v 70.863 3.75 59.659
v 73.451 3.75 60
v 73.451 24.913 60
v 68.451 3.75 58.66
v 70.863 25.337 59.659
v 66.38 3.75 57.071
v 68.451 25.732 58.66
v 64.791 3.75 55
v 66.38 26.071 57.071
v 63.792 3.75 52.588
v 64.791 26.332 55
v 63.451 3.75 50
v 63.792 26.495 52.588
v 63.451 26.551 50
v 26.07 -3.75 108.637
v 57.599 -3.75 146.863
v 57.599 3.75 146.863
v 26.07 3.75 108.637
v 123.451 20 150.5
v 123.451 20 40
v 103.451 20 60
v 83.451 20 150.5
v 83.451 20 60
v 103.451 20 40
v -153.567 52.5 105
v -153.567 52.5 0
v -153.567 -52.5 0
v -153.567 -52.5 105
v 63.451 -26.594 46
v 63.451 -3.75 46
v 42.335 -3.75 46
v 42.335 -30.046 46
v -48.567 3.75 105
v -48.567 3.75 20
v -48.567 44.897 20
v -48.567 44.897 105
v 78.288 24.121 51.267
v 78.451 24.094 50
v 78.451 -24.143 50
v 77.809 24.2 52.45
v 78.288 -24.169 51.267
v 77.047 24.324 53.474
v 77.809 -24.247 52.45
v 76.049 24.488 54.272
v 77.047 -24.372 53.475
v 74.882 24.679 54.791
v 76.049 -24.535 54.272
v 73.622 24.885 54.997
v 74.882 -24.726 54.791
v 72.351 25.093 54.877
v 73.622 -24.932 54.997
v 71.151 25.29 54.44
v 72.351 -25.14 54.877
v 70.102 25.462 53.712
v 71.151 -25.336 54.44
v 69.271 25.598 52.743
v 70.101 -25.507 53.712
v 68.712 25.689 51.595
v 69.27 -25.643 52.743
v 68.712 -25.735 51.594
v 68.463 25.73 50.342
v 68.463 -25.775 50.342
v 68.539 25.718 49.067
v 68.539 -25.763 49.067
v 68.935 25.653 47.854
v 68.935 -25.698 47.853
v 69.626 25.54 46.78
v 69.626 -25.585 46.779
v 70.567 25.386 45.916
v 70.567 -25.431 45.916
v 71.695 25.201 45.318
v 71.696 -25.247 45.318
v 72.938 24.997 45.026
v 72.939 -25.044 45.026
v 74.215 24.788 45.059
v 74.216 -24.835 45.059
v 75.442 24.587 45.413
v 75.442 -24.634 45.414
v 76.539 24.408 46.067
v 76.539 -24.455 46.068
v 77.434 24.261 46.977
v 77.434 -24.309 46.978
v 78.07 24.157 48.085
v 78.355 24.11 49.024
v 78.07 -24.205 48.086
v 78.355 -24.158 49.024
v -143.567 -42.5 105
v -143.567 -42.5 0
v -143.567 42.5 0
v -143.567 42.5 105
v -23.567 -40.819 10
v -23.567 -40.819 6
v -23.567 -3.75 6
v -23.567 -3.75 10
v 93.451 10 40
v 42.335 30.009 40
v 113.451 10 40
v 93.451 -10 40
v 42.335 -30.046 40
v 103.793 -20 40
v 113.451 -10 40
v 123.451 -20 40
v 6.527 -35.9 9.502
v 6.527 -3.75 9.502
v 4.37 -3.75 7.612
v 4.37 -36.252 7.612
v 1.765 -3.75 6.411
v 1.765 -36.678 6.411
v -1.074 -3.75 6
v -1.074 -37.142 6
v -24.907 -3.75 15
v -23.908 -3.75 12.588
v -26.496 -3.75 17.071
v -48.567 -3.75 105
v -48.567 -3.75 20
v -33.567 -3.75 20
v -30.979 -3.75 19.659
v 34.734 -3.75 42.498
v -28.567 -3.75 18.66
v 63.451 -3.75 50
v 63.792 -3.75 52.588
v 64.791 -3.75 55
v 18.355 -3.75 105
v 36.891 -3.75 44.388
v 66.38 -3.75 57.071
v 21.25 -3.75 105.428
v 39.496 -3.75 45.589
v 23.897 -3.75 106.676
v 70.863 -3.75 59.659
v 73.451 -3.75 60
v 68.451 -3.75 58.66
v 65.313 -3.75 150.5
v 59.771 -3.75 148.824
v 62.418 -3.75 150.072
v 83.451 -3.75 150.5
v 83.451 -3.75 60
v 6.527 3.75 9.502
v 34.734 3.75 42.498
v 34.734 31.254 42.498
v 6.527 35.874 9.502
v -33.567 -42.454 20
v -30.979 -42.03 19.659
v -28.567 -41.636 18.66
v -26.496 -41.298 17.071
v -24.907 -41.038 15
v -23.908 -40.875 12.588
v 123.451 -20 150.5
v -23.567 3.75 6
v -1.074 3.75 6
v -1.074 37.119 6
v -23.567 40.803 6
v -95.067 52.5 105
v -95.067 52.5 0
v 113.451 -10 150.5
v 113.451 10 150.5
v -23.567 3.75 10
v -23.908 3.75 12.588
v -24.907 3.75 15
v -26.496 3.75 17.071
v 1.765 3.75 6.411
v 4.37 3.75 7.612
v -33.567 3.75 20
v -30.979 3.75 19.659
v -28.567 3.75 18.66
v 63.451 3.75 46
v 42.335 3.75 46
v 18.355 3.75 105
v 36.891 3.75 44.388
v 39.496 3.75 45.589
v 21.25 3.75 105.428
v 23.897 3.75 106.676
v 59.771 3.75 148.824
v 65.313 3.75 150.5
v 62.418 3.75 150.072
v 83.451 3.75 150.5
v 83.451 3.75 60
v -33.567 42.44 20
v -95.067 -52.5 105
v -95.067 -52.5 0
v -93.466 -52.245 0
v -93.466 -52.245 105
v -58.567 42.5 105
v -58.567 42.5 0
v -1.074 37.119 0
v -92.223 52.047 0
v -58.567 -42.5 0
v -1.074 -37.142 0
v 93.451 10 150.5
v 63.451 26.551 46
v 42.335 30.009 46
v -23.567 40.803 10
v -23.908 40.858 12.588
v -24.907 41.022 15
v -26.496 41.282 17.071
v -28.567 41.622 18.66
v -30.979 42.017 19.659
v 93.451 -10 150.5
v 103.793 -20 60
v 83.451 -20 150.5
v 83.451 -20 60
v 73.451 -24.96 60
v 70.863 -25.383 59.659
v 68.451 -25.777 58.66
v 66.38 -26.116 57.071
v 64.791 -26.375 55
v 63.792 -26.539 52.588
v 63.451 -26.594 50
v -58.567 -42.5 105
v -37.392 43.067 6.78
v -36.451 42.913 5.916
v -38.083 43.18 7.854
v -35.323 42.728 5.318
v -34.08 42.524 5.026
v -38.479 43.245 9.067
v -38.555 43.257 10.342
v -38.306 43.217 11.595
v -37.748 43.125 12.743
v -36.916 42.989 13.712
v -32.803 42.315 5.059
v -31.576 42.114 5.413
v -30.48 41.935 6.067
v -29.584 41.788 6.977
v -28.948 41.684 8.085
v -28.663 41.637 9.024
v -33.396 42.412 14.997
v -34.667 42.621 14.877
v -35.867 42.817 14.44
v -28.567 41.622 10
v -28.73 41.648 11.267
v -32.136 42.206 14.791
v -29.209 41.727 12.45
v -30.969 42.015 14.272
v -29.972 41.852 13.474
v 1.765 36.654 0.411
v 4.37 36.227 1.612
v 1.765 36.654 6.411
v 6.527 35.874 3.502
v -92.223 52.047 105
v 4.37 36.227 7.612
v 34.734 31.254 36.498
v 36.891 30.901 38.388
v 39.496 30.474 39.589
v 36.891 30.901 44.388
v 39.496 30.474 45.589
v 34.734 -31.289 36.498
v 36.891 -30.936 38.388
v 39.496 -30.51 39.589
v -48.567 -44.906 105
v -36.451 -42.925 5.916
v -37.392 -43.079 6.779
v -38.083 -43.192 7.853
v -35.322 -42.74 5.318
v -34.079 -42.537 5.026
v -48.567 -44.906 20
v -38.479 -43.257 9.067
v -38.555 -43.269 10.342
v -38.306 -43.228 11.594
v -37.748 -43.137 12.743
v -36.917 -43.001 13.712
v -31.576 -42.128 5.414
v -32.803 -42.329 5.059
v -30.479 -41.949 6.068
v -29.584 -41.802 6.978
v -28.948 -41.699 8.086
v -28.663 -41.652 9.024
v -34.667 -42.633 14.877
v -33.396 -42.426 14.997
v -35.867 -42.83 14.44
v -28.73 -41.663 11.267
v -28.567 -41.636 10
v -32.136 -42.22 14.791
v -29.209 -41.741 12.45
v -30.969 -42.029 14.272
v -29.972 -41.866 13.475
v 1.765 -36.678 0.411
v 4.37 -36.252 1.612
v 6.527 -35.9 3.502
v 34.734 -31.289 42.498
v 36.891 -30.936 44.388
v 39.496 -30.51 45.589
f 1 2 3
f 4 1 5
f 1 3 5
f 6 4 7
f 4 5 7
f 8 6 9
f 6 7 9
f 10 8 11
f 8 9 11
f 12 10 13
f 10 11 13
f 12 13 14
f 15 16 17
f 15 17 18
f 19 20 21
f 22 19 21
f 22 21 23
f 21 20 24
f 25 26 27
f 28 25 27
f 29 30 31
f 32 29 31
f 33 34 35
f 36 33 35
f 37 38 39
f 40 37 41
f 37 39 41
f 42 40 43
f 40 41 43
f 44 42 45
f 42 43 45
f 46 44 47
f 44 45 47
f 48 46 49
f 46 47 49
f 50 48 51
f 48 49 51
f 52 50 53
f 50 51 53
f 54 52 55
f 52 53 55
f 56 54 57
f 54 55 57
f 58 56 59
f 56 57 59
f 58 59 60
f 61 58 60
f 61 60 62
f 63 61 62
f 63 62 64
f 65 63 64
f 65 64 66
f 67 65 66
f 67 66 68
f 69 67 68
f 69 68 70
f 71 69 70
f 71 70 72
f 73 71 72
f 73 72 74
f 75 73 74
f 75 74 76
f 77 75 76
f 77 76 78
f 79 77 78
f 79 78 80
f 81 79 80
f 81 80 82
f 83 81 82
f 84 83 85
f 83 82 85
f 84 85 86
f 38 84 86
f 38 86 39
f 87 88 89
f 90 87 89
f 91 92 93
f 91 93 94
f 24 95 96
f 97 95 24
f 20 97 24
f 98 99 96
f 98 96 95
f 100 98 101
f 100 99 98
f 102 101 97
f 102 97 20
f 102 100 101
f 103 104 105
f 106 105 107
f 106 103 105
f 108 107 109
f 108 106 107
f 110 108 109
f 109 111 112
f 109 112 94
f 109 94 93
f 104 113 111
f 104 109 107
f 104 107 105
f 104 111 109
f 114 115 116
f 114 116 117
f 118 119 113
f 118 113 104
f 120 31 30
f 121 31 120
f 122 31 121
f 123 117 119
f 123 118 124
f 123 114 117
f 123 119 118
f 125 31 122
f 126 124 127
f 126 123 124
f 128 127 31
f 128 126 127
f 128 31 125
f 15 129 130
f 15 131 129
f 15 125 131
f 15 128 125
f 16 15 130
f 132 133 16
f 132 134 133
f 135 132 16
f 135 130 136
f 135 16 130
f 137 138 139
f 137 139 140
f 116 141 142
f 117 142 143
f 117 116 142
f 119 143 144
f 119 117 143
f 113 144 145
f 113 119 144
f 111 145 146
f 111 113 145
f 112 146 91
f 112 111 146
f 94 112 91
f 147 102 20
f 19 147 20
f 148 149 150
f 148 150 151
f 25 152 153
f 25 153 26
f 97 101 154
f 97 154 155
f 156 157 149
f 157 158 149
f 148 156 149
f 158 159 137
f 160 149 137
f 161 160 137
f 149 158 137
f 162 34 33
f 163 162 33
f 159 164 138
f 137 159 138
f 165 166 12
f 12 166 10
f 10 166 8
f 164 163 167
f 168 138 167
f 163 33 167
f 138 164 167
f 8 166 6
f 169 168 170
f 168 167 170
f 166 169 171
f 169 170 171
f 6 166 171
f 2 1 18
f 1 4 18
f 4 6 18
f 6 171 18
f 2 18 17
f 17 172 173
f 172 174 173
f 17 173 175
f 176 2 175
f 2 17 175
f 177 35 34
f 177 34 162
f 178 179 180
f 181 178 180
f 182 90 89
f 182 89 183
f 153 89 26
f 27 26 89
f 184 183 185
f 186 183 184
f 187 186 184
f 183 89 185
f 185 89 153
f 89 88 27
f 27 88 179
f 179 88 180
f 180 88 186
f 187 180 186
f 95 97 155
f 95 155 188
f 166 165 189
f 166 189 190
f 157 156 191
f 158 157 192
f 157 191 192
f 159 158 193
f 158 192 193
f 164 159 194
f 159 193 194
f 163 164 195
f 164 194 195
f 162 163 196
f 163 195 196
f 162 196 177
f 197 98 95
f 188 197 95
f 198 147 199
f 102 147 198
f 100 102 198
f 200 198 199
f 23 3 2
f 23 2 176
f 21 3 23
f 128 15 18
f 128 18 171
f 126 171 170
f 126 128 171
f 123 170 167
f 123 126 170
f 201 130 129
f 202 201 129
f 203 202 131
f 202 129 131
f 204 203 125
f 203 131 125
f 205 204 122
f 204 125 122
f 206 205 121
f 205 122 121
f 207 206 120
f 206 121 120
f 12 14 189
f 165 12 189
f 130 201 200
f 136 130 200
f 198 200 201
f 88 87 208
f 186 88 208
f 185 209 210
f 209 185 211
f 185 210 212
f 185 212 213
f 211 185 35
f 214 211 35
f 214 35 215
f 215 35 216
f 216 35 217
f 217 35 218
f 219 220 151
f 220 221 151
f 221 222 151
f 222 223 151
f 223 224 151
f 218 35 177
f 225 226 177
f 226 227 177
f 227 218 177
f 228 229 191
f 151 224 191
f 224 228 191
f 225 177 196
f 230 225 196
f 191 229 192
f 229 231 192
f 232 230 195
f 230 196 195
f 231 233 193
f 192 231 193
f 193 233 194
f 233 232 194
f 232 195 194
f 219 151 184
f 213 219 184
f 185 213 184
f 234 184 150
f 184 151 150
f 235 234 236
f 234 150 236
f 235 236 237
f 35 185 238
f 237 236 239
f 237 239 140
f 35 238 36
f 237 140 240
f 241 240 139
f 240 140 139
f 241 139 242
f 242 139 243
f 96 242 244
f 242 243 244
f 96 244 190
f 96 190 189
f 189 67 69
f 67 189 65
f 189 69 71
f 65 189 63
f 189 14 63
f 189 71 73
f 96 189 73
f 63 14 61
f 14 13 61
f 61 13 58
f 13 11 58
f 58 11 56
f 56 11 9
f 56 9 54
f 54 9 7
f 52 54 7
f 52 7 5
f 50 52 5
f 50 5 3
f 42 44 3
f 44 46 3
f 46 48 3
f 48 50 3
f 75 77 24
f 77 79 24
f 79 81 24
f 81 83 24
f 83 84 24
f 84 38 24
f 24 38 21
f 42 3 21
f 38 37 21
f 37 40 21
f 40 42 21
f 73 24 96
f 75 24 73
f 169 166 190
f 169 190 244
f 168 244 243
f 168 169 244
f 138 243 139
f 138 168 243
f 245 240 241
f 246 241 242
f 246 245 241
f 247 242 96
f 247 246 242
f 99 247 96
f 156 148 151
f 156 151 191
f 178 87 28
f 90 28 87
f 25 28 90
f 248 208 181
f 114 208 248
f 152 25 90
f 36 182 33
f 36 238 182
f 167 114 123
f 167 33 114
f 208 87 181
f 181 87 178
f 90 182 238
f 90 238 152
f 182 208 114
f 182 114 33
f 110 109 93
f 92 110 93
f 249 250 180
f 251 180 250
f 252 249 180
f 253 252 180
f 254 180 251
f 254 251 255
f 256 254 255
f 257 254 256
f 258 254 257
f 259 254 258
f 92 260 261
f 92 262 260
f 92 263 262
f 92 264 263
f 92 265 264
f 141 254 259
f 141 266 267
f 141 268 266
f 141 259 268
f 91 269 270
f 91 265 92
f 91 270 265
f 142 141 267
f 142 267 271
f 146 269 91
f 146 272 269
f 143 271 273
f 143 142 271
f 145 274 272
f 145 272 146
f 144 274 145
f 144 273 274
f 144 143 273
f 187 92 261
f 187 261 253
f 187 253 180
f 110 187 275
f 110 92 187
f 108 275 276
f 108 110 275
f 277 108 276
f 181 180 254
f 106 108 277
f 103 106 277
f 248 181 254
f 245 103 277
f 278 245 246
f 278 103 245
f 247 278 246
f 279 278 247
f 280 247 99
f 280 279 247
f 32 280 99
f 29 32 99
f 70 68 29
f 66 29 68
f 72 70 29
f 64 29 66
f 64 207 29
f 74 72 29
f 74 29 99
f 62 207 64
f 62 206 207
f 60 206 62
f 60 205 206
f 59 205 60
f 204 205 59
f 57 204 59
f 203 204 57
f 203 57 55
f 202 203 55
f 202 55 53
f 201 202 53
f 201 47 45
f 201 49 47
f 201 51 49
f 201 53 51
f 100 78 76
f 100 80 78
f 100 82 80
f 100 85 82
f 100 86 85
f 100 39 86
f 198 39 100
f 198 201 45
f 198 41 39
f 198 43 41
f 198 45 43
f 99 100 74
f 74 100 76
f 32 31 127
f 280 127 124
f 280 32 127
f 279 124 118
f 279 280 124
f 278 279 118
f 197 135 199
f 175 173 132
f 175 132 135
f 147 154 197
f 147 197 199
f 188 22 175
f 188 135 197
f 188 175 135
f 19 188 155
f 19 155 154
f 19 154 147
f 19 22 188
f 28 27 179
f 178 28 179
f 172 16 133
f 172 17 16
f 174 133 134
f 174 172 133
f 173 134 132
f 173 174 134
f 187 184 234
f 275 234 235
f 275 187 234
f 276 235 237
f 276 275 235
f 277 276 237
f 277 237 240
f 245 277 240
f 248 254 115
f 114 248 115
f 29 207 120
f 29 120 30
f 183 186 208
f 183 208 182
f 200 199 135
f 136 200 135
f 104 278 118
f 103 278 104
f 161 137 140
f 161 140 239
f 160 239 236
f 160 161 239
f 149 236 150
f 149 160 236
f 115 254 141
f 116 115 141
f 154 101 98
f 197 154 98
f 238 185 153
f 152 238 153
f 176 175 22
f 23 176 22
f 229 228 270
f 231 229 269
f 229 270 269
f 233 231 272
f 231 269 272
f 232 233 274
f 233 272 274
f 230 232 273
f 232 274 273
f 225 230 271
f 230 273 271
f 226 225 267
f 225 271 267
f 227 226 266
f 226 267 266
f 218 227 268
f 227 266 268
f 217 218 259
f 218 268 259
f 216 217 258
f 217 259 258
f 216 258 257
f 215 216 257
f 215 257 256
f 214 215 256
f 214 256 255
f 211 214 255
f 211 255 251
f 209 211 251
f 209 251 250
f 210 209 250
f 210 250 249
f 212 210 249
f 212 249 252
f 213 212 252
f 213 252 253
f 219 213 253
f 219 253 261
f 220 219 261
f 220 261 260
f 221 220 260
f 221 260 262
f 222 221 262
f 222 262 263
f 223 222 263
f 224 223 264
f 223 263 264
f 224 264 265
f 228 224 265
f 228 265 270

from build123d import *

# Parameters (mm, degrees)
ESQUISSE1_W             = 85
ESQUISSE1_H             = 85
BOSS_EXTRU_1_DEPTH      = 105
ESQUISSE2_W             = 25
ESQUISSE2_H             = 20
BOSS_EXTRU_2_DEPTH      = 105
ESQUISSE3_R             = 5
ENL_V_MAT_EXTRU_1_DEPTH = 106
BOSS_EXTRU_3_REACH      = 107
ESQUISSE5_W             = 25
ESQUISSE5_H             = 7.5
CONG_1_R                = 10
ESQUISSE6_W             = 40
ESQUISSE6_H             = 40
ESQUISSE6_W_2           = 20
ESQUISSE6_H_2           = 20.000133682
BOSS_EXTRU_5_DEPTH      = 83
BOSS_EXTRU_5_DEPTH_BACK = 176
ESQUISSE7_W             = 67.482972399
ESQUISSE7_H             = 90.273524416
ESQUISSE7_H_2           = 40
ENL_V_MAT_EXTRU_2_DEPTH = 106
ESQUISSE8_W             = 40
ESQUISSE8_H             = 25.5
ENL_V_MAT_EXTRU_3_DEPTH = 73.5
ESQUISSE9_W             = 20
ESQUISSE9_H             = 20
BOSS_EXTRU_7_DEPTH      = 40
ESQUISSE11_W            = 40.341877054
ESQUISSE11_H            = 20
BOSS_EXTRU_8_DEPTH      = 32.5
ESQUISSE12_W            = 40
ESQUISSE12_H            = 20
BOSS_EXTRU_9_DEPTH      = 32.5
ESQUISSE13_R            = 5
ENL_V_MAT_EXTRU_4_DEPTH = 106
BOSS_EXTRU_11_DEPTH     = 105
BOSS_EXTRU_12_REACH     = 152.5
ESQUISSE15_W            = 107.018090517
ESQUISSE15_H            = 7.5
CONG_2_R                = 10
CONG_3_R                = 10
ENL_V_MAT_EXTRU_6_DEPTH = 57.25
CONG_4_R                = 10
ENL_V_MAT_EXTRU_7_DEPTH = 151.5
ENL_V_MAT_EXTRU_8_DEPTH = 151.5
ENL_V_MAT_EXTRU_9_DEPTH = 151.5


with BuildPart() as part:
    # Esquisse1 → Boss.-Extru.1 (new body)
    with BuildSketch(Plane.XY):
        Polygon((-48.567045776, 45.091911765), (-95.067045776, 52.5), (-153.567045776, 52.5), (-153.567045776, -52.5), (-95.067045776, -52.5), (-48.567045776, -45.091911765), align=None)
        with Locations((-101.067045776, 0)):
            Rectangle(ESQUISSE1_W, ESQUISSE1_H, mode=Mode.SUBTRACT)
    extrude(amount=BOSS_EXTRU_1_DEPTH)

    # Esquisse2 → Boss.-Extru.2 (add, through all)
    with BuildSketch(Plane.XZ.offset(52.5)):
        with Locations((-36.067045776, 10)):
            Rectangle(ESQUISSE2_W, ESQUISSE2_H)
    extrude(amount=-BOSS_EXTRU_2_DEPTH)

    # Esquisse3 → Enlèv. mat.-Extru.1 (cut, through all)
    with BuildSketch(Plane.XZ.offset(52.5)):
        with Locations((-33.567045776, 10)):
            Circle(ESQUISSE3_R)
    extrude(amount=-ENL_V_MAT_EXTRU_1_DEPTH, mode=Mode.SUBTRACT)

    # Esquisse5 → Boss.-Extru.3 (add, up to next)
    with BuildSketch(Plane.XY.offset(105), mode=Mode.PRIVATE) as boss_extru_3_sk1:
        with Locations((-36.067045776, 0)):
            Rectangle(ESQUISSE5_W, ESQUISSE5_H)
    boss_extru_3_tool1 = extrude(boss_extru_3_sk1.sketch, amount=-BOSS_EXTRU_3_REACH, mode=Mode.PRIVATE) - part.part
    add(boss_extru_3_tool1.solids().sort_by_distance((-36.067046, 0, 105))[0])

    # Congé1
    cong_1_edges = [part.edges().sort_by_distance(p)[0] for p in [
        (-23.567045776, 28.125, 20),
        (-23.567045776, -28.125, 20),
    ]]
    fillet(cong_1_edges, radius=CONG_1_R)



with BuildPart() as body_2:
    # Esquisse6 → Boss.-Extru.5 (new body, two sides)
    with BuildSketch(Plane(origin=(0, 0, 0), x_dir=(-1, 0, 0), z_dir=(0, 0, -1))) as boss_extru_5_sk:
        with Locations((-103.451044741, 0)):
            Rectangle(ESQUISSE6_W, ESQUISSE6_H)
        with Locations((-103.451044741, 0)):
            Rectangle(ESQUISSE6_W_2, ESQUISSE6_H_2, mode=Mode.SUBTRACT)
    extrude(amount=BOSS_EXTRU_5_DEPTH)
    extrude(boss_extru_5_sk.sketch, amount=-BOSS_EXTRU_5_DEPTH_BACK)

    # Esquisse7 → Enlèv. mat.-Extru.2 (cut, through all)
    with BuildSketch(Plane.XZ.offset(52.5)):
        with Locations((109.464150934, -45.136762208)):
            Rectangle(ESQUISSE7_W, ESQUISSE7_H)
        with Locations((109.464150934, 20)):
            Rectangle(ESQUISSE7_W, ESQUISSE7_H_2)
    extrude(amount=-ENL_V_MAT_EXTRU_2_DEPTH, mode=Mode.SUBTRACT)

    # Esquisse8 → Enlèv. mat.-Extru.3 (cut, through all)
    with BuildSketch(Plane.XZ.offset(20)):
        with Locations((103.451044741, 163.25)):
            Rectangle(ESQUISSE8_W, ESQUISSE8_H)
    extrude(amount=-ENL_V_MAT_EXTRU_3_DEPTH, mode=Mode.SUBTRACT)

    # Esquisse9 → Boss.-Extru.7 (add)
    with BuildSketch(Plane(origin=(0, -20, 0), x_dir=(-1, 0, 0), z_dir=(0, -1, 0))):
        with Locations((-73.451044741, -50)):
            Rectangle(ESQUISSE9_W, ESQUISSE9_H)
    extrude(amount=-BOSS_EXTRU_7_DEPTH)

    # Esquisse11 → Boss.-Extru.8 (add)
    with BuildSketch(Plane.XZ.offset(52.5)):
        with Locations((83.621983268, 50)):
            Rectangle(ESQUISSE11_W, ESQUISSE11_H)
    extrude(amount=-BOSS_EXTRU_8_DEPTH)

    # Esquisse12 → Boss.-Extru.9 (add)
    with BuildSketch(Plane(origin=(0, 52.5, 0), x_dir=(1, 0, 0), z_dir=(0, 1, 0))):
        with Locations((83.451044741, -50)):
            Rectangle(ESQUISSE12_W, ESQUISSE12_H)
    extrude(amount=-BOSS_EXTRU_9_DEPTH)

    # Esquisse13 → Enlèv. mat.-Extru.4 (cut, through all)
    with BuildSketch(Plane.XZ.offset(52.5)):
        with Locations((73.451044741, 50)):
            Circle(ESQUISSE13_R)
    extrude(amount=-ENL_V_MAT_EXTRU_4_DEPTH, mode=Mode.SUBTRACT)


with BuildPart() as part_1:
    add(part.part)

    add(body_2.part)  # Boss.-Extru.11 merges body 2
    # Esquisse14 → Boss.-Extru.11 (add, through all)
    with BuildSketch(Plane.XZ.offset(52.5)):
        with BuildLine():
            Line((-23.567045776, 0), (-1.074115191, 0))
            ThreePointArc((-1.074115191, 0), (3.110427636, 0.917621383), (6.527005267, 3.502079733))
            Line((6.527005267, 3.502079733), (34.733944249, 36.497920267))
            ThreePointArc((34.733944249, 36.497920267), (38.15052188, 39.082378617), (42.335064706, 40))
            Line((42.335064706, 40), (63.451044741, 40))
            Line((63.451044741, 40), (63.451044741, 46))
            Line((63.451044741, 46), (42.335064706, 46))
            ThreePointArc((42.335064706, 46), (38.15052188, 45.082378617), (34.733944249, 42.497920267))
            Line((34.733944249, 42.497920267), (6.527005267, 9.502079733))
            ThreePointArc((6.527005267, 9.502079733), (3.110427636, 6.917621383), (-1.074115191, 6))
            Line((-1.074115191, 6), (-23.567045776, 6))
            Line((-23.567045776, 6), (-23.567045776, 0))
        make_face()
    extrude(amount=-BOSS_EXTRU_11_DEPTH)

    # Esquisse15 → Boss.-Extru.12 (add, up to next)
    with BuildSketch(Plane.XY.offset(150.5), mode=Mode.PRIVATE) as boss_extru_12_sk1:
        with Locations((29.941999483, 0)):
            Rectangle(ESQUISSE15_W, ESQUISSE15_H)
    boss_extru_12_tool1 = extrude(boss_extru_12_sk1.sketch, amount=-BOSS_EXTRU_12_REACH, mode=Mode.PRIVATE) - part_1.part
    add(boss_extru_12_tool1.solids().sort_by_distance((29.941999, 0, 150.5))[0])

    # Congé2
    cong_2_edges = [part_1.edges().sort_by_distance(p)[0] for p in [
        (63.451044741, -28.125, 60),
    ]]
    fillet(cong_2_edges, radius=CONG_2_R)

    # Congé3
    cong_3_edges = [part_1.edges().sort_by_distance(p)[0] for p in [
        (63.451044741, 28.125, 60),
    ]]
    fillet(cong_3_edges, radius=CONG_3_R)

    # Esquisse16 → Enlèv. mat.-Extru.6 (cut, through all)
    with BuildSketch(Plane.XZ.offset(3.75)):
        with BuildLine():
            Line((60.598915971, 150.5), (26.069543092, 108.637003713))
            ThreePointArc((26.069543092, 108.637003713), (22.619512531, 105.954836572), (18.355122942, 105))
            Line((18.355122942, 105), (-23.567045776, 105))
            Line((-23.567045776, 105), (-23.567045776, 150.5))
            Line((-23.567045776, 150.5), (60.598915971, 150.5))
        make_face()
    extrude(amount=-ENL_V_MAT_EXTRU_6_DEPTH, mode=Mode.SUBTRACT)

    # Congé4
    cong_4_edges = [part_1.edges().sort_by_distance(p)[0] for p in [
        (60.598915971, 0, 150.5),
    ]]
    fillet(cong_4_edges, radius=CONG_4_R)

    # Esquisse17 → Enlèv. mat.-Extru.7 (cut, through all)
    with BuildSketch(Plane.XY.offset(150.5)):
        Polygon((-93.466358172, -52.244988494), (103.792921795, -20), (103.792921795, -55.275638449), align=None)
    extrude(amount=-ENL_V_MAT_EXTRU_7_DEPTH, mode=Mode.SUBTRACT)

    # Esquisse18 → Enlèv. mat.-Extru.8 (cut, through all)
    with BuildSketch(Plane.XY.offset(150.5)):
        Polygon((-92.222865715, 52.046883079), (103.451044741, 20), (103.451044741, 52.5), align=None)
    extrude(amount=-ENL_V_MAT_EXTRU_8_DEPTH, mode=Mode.SUBTRACT)

    # Esquisse19 → Enlèv. mat.-Extru.9 (cut, through all)
    with BuildSketch(Plane.XY.offset(150.5)):
        Polygon((-79.463248921, 79.178617238), (139.979375794, 56.935567532), (111.241114329, 33.487041007), (-48.920553802, 47.63996467), align=None)
    extrude(amount=-ENL_V_MAT_EXTRU_9_DEPTH, mode=Mode.SUBTRACT)


solid = part_1.part
